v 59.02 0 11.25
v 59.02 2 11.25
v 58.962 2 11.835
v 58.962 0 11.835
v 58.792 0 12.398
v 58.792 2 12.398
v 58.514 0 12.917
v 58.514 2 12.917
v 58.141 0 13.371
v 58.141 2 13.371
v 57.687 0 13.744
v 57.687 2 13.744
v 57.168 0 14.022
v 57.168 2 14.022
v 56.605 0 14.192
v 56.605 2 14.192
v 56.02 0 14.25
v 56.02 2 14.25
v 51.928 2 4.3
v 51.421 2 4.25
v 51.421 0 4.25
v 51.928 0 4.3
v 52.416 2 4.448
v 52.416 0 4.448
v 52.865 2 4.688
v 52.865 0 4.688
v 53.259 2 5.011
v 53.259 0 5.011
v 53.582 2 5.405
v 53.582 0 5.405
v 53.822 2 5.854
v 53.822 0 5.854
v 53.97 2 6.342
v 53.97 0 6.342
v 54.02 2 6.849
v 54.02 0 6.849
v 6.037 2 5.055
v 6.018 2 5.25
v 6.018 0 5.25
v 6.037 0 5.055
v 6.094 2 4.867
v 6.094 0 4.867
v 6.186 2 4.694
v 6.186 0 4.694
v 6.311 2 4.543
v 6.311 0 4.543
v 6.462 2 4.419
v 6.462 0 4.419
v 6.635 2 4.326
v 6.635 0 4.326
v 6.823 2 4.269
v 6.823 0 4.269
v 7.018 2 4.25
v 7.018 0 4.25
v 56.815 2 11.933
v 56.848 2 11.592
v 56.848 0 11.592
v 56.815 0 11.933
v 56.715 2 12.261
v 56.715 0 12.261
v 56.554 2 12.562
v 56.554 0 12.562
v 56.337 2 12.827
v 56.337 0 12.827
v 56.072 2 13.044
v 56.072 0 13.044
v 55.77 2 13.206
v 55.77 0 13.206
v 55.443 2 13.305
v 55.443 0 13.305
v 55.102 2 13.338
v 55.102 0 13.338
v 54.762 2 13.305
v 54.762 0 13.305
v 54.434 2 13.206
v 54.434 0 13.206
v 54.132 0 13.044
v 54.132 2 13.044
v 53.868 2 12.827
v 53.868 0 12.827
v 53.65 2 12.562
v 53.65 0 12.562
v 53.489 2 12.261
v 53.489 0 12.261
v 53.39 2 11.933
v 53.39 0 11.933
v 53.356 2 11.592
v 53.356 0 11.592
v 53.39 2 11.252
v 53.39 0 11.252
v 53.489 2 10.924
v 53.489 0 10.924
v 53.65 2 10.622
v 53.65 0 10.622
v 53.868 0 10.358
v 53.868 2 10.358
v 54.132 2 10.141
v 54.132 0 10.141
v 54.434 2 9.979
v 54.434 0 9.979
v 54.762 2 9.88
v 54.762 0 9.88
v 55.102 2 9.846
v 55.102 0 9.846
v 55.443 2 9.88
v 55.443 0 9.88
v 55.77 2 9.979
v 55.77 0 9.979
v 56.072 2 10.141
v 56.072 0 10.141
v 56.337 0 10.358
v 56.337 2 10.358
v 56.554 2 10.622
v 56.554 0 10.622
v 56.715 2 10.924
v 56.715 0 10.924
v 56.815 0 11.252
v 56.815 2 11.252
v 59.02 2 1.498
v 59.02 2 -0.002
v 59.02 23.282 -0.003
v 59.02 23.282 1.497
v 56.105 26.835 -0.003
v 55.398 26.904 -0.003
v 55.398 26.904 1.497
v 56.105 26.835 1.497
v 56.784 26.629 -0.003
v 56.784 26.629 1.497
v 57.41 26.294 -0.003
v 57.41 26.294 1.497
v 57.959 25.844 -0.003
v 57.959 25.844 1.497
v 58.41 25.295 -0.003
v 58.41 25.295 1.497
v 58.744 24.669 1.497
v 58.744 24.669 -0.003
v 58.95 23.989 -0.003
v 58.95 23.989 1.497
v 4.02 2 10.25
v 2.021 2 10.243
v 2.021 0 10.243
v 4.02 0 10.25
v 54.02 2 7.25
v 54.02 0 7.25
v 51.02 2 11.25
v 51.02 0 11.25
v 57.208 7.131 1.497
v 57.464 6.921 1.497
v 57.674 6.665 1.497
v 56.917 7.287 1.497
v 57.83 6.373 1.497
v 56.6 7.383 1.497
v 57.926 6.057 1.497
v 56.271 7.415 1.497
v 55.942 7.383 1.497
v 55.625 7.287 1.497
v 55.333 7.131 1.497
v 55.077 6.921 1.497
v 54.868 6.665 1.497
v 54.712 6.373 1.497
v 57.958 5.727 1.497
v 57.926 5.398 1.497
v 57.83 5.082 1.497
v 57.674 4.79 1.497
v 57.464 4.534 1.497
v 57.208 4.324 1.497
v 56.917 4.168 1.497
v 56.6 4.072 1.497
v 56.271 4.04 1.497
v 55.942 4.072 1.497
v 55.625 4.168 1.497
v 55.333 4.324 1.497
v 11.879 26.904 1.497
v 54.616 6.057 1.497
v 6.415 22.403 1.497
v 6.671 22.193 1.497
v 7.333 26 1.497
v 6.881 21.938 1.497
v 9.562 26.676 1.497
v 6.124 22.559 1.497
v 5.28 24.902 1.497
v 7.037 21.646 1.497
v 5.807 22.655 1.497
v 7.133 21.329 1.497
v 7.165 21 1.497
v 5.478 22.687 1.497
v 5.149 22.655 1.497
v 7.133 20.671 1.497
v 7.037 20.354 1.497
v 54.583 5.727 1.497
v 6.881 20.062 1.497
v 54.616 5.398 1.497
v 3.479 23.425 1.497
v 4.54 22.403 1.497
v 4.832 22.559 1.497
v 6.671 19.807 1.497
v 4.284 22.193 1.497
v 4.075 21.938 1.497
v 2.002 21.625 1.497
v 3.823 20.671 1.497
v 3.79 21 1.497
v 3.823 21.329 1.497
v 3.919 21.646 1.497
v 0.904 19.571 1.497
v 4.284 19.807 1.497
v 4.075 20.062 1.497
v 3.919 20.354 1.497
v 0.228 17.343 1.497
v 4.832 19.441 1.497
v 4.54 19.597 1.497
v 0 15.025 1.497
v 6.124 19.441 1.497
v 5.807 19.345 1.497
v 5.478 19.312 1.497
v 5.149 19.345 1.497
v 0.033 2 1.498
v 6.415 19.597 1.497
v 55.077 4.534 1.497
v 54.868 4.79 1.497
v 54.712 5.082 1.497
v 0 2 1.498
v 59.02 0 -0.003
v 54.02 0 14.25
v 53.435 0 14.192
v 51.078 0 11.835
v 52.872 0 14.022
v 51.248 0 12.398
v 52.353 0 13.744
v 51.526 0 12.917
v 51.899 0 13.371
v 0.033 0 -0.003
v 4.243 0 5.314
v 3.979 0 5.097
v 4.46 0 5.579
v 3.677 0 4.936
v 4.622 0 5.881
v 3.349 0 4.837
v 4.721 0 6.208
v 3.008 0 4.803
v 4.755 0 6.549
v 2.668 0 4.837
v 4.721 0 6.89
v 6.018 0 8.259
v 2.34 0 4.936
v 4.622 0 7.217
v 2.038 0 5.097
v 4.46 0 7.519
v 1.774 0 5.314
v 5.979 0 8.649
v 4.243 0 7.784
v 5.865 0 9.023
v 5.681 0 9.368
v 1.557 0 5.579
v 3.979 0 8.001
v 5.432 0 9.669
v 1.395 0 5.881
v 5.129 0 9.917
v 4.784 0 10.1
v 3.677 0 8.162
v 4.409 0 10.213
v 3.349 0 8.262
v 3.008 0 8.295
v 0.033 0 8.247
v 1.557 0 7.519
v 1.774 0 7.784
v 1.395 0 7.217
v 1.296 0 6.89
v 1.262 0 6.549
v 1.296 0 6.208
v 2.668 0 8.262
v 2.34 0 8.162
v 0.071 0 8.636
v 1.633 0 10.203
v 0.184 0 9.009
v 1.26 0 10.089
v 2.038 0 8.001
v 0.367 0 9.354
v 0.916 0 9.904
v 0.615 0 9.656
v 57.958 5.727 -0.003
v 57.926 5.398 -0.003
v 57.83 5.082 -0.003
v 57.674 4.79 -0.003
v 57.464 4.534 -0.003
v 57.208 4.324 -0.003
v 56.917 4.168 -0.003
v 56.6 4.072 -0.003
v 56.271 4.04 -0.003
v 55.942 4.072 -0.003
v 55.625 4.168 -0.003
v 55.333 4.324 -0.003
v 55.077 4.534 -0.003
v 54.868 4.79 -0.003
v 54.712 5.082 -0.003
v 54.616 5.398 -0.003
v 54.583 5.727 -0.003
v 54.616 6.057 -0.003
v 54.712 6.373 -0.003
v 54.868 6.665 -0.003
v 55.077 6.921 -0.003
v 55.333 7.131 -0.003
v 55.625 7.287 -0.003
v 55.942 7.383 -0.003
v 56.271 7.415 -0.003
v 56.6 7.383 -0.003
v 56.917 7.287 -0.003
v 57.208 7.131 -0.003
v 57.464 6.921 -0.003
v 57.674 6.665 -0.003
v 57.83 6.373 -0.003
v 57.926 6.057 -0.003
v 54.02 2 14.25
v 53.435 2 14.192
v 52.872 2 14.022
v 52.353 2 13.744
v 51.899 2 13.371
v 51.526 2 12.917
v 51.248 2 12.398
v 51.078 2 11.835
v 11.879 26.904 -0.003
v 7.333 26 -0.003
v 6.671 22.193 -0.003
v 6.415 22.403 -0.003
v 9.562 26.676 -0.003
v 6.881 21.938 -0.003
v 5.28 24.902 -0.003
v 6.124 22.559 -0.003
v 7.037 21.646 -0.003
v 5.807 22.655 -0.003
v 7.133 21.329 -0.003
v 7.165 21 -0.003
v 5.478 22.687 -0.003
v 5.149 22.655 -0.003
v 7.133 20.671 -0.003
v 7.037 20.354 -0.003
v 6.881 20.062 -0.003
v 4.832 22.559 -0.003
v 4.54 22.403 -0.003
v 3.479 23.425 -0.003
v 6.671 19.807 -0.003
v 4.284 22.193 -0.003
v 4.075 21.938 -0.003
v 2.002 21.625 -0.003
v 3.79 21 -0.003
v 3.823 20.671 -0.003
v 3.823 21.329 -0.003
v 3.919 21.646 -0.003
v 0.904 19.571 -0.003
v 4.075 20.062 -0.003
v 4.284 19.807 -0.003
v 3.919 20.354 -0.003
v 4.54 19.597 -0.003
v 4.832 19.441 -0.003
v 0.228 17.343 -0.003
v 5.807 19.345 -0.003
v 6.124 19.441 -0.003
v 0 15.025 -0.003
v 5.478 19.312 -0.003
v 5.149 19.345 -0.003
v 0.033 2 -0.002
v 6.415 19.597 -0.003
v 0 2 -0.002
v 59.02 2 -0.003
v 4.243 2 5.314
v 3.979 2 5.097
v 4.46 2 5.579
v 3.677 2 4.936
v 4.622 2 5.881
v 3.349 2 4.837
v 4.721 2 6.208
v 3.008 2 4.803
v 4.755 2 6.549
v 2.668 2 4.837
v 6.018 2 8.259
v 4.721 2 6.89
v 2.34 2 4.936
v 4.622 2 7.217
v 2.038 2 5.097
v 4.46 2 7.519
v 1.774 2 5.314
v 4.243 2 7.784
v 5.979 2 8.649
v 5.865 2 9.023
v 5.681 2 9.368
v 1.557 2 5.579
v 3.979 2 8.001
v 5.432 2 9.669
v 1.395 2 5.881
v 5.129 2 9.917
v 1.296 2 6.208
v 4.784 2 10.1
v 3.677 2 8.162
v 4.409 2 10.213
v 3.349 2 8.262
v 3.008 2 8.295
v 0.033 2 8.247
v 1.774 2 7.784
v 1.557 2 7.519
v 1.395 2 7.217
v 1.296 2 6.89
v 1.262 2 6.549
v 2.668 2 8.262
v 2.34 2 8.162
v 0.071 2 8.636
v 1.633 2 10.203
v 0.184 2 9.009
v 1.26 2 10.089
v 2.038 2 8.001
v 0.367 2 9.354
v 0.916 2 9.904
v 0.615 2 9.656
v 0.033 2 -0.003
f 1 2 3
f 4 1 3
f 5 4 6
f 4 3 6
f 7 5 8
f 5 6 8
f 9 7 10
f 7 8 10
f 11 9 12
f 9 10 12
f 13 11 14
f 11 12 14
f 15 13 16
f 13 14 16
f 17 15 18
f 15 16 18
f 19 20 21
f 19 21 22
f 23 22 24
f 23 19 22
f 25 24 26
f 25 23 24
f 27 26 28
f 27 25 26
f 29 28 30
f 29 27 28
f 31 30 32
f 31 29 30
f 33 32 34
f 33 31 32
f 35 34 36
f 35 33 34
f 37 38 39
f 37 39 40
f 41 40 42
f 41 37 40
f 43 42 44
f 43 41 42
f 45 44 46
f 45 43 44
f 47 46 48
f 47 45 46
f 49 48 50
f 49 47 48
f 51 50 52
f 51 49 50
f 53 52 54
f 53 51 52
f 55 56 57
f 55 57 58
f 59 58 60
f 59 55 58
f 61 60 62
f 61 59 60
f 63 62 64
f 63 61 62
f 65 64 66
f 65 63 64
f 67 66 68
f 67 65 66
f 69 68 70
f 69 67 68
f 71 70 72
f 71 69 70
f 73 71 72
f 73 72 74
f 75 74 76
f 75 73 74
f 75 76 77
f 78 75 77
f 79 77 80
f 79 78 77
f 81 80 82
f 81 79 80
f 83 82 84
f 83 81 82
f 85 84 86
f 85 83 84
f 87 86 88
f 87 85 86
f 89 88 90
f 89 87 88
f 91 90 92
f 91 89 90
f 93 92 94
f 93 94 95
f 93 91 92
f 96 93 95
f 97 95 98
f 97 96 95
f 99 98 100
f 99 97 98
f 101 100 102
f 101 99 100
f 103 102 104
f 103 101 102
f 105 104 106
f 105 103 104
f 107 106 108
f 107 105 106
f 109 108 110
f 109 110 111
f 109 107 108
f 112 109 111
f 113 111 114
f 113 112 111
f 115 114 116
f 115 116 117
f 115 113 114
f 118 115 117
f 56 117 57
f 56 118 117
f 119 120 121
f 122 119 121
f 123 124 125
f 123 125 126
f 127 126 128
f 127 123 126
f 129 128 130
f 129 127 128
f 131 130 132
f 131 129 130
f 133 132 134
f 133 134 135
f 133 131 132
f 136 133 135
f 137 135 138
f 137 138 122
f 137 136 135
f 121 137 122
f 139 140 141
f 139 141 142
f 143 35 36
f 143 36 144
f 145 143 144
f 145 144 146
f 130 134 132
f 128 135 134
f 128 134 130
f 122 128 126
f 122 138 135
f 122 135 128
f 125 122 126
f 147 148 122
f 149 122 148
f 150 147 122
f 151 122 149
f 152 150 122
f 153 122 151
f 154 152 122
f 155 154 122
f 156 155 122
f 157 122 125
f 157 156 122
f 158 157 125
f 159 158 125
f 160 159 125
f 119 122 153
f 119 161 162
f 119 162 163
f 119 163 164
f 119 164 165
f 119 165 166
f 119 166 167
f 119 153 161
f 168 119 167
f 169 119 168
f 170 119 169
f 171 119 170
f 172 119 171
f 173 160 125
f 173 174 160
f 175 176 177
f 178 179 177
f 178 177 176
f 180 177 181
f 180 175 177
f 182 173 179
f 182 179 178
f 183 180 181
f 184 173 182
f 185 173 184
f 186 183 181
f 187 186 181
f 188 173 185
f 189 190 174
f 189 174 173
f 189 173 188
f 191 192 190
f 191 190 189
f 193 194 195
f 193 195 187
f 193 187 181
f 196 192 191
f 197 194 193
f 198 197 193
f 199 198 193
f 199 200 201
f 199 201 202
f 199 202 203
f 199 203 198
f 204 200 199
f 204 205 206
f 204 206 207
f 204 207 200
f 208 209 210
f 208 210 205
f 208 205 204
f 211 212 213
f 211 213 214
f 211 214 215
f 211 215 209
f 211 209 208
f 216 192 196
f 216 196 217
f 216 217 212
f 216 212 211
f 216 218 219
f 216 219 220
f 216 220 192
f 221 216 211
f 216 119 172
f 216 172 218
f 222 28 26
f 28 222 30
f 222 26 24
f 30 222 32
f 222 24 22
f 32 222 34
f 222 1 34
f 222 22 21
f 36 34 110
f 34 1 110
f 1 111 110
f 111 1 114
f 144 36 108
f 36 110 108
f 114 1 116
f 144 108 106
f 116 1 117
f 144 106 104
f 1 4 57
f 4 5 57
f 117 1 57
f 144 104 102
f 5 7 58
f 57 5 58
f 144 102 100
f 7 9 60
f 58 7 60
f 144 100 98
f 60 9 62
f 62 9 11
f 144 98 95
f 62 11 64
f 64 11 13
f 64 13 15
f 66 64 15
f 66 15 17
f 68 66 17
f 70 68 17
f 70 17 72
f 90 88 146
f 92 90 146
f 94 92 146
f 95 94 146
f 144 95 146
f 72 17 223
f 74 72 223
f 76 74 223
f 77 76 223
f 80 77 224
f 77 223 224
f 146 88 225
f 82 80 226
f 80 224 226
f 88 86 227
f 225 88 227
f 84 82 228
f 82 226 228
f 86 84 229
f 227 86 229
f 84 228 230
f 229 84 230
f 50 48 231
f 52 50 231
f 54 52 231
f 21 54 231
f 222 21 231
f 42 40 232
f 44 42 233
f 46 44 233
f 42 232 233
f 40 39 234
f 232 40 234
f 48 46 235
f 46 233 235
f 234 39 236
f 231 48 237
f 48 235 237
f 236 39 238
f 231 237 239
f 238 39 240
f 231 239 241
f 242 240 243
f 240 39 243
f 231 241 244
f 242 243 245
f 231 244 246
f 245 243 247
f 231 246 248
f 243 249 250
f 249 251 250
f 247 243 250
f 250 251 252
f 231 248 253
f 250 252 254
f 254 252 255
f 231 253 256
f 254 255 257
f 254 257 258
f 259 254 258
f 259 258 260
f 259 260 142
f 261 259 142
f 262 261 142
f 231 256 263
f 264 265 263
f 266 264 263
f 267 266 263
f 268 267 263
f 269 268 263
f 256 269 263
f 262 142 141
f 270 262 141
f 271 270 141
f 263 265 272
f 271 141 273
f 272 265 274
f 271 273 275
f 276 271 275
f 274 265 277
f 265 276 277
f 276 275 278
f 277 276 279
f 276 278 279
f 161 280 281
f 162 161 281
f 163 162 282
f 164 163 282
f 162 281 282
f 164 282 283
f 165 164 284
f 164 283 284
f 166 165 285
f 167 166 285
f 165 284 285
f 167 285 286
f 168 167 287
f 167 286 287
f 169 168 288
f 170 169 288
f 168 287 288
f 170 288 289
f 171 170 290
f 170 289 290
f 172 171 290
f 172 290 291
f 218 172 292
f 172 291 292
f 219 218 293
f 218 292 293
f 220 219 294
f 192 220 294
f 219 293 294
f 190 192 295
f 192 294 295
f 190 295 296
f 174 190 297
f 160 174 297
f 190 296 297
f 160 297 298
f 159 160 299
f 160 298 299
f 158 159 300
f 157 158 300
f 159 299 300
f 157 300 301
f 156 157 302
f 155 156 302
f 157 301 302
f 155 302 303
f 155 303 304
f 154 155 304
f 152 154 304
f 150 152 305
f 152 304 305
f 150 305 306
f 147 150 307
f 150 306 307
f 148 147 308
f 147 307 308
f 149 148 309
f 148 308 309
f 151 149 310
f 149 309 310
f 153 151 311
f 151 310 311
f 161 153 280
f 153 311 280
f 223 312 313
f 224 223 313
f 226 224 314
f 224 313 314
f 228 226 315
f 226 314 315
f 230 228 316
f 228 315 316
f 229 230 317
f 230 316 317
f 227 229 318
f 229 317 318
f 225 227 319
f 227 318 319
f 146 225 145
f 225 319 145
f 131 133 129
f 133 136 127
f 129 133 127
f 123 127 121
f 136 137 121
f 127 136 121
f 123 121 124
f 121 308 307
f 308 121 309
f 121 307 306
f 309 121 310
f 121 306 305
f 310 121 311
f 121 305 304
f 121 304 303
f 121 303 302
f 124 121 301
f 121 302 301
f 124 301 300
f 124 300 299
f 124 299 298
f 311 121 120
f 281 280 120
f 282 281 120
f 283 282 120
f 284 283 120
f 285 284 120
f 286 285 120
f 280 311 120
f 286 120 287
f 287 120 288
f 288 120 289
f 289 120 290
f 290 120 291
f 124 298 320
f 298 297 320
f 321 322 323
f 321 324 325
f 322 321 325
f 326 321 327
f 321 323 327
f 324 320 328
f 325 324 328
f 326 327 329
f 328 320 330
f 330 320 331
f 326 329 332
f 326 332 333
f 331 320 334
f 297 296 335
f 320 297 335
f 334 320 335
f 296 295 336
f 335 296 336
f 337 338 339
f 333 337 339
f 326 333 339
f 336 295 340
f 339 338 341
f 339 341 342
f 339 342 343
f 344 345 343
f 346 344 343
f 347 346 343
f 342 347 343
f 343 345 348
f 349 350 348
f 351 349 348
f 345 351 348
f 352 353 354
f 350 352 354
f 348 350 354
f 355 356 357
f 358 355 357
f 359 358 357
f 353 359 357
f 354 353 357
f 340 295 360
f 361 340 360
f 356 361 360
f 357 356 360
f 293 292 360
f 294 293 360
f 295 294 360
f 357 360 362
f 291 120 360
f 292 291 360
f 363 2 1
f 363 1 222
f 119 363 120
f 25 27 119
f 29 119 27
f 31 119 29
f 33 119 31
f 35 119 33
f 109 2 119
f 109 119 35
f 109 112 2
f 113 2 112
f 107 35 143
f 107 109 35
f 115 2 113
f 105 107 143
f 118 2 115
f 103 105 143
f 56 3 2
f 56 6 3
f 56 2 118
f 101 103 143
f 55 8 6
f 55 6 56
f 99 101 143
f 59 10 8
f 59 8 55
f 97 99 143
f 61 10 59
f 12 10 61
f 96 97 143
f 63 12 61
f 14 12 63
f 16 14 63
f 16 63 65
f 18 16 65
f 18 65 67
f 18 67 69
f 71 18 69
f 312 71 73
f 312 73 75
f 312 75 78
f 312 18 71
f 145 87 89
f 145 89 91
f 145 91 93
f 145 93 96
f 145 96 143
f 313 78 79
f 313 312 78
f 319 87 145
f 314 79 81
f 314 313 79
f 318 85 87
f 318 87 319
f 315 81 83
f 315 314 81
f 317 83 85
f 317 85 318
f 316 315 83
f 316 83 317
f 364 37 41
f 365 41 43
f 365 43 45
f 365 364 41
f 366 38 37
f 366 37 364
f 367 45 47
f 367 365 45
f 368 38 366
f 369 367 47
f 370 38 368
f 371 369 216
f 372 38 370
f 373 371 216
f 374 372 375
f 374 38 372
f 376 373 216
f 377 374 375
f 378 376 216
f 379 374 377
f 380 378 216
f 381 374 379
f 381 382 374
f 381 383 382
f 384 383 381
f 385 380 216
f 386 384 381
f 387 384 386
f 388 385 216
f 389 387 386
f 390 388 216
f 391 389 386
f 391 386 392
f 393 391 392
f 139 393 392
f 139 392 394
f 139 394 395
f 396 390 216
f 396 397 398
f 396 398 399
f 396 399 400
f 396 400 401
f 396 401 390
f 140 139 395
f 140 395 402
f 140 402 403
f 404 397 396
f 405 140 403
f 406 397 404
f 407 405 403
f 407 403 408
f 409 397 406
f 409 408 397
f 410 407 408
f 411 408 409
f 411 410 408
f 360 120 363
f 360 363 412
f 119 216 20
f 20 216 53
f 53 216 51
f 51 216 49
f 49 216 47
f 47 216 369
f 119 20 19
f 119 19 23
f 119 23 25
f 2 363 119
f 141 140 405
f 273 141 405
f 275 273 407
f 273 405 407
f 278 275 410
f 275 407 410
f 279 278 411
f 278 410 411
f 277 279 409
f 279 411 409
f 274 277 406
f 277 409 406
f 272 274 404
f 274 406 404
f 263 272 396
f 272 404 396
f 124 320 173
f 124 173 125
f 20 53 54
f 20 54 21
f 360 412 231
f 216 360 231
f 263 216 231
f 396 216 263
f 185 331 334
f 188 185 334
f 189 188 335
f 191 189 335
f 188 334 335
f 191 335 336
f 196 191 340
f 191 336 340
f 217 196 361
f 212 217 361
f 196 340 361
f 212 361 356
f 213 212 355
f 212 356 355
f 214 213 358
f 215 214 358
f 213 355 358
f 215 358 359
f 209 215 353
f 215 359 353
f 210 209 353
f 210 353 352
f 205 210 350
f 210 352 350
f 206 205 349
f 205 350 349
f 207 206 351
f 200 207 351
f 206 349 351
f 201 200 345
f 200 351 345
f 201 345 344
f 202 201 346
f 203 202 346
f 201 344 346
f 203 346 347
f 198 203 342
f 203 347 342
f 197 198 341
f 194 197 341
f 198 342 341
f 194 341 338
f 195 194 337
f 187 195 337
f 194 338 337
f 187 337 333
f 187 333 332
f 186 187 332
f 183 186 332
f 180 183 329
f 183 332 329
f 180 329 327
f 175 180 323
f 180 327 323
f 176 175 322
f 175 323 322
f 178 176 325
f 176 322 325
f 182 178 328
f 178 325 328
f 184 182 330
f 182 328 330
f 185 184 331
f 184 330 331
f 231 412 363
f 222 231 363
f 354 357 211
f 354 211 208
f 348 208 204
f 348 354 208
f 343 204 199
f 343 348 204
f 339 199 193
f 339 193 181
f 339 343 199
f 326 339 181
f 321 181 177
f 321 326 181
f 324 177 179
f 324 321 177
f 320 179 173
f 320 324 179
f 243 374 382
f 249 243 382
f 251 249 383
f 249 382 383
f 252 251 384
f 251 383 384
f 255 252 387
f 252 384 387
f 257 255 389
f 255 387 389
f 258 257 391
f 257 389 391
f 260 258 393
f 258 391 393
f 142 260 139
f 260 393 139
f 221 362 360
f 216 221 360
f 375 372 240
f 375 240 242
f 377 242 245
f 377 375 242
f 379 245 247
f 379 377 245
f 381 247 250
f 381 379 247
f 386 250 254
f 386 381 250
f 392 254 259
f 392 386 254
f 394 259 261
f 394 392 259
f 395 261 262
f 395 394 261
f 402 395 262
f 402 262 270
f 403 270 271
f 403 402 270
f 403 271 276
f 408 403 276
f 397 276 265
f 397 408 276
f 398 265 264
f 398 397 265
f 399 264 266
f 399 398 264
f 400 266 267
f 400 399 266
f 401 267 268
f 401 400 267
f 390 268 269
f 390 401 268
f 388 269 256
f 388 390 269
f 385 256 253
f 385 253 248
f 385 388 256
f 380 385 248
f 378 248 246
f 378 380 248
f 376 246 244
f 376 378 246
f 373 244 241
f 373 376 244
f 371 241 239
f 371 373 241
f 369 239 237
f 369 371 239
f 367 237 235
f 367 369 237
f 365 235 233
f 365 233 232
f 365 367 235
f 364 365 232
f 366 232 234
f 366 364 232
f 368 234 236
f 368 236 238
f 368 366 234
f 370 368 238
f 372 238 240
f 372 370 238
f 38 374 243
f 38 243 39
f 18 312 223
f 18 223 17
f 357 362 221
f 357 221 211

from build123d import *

# Parameters (mm, degrees)
SKETCH001_R       = 1.687519
PAD001_DEPTH      = 1.5
SKETCH_R          = 1.746092
PAD_DEPTH         = 2
FUSION_ROLL_ANGLE = 90


with BuildPart() as base_and_horizontal_holder:
    # Sketch001 → Pad001 (new body)
    with BuildSketch(Plane.XZ.offset(1.2525)):
        with BuildLine():
            Line((10.979984, 0), (69.999984, 0))
            Line((69.999984, 0), (69.999984, -21.282469))
            ThreePointArc((66.378106, -24.904346), (68.93916, -23.843523), (69.999984, -21.282469))
            Line((22.859289, -24.904346), (66.378106, -24.904346))
            ThreePointArc((10.979984, -13.025041), (14.459352, -21.424978), (22.859289, -24.904346))
            Line((10.979984, 0), (10.979984, -13.025041))
        make_face()
        with Locations((67.250752, -3.727469)):
            Circle(SKETCH001_R, mode=Mode.SUBTRACT)
        with Locations((16.457752, -18.999969)):
            Circle(SKETCH001_R, mode=Mode.SUBTRACT)
    extrude(amount=-PAD001_DEPTH)


with BuildPart() as icezum_vertical_horizontal_stand_holder:
    # Sketch → Pad (new body)
    with BuildSketch(Plane.XY):
        with BuildLine():
            Line((11.012519, -1.25328), (11.012519, 6.997142))
            ThreePointArc((13.001287, 8.992943), (11.59459, 8.405902), (11.012519, 6.997142))
            Line((13.001287, 8.992943), (15, 9))
            ThreePointArc((16.997615, 7.009425), (16.412099, 8.419465), (15, 9))
            Line((16.997615, 7.009425), (16.997615, 4))
            ThreePointArc((16.997615, 4), (17.290509, 3.292893), (17.997615, 3))
            Line((17.997615, 3), (62, 3))
            Line((62, 3), (62.401287, 3))
            ThreePointArc((62.401287, 3), (64.238855, 3.761145), (65, 5.598713))
            Line((65, 5.598713), (65, 6))
            Line((65, 6), (62, 10))
            ThreePointArc((65, 13), (62.87868, 12.12132), (62, 10))
            Line((65, 13), (67, 13))
            ThreePointArc((70, 10), (69.12132, 12.12132), (67, 13))
            Line((70, 10), (70, -1.25328))
            Line((11.012519, -1.25328), (70, -1.25328))
        make_face()
        with Locations((13.988471, 5.299093)):
            Circle(SKETCH_R, mode=Mode.SUBTRACT)
        with Locations((66.082271, 10.342403)):
            Circle(SKETCH_R, mode=Mode.SUBTRACT)
    extrude(amount=PAD_DEPTH)

    # Fusion: union base_and_horizontal_holder
    add(base_and_horizontal_holder.part)


with BuildPart() as icezum_vertical_horizontal_stand_holder_1:
    # Fusion roll: moved
    add(icezum_vertical_horizontal_stand_holder.part.rotate(Axis((0, 0, 0), (1, 0, 0)), FUSION_ROLL_ANGLE))


with BuildPart() as icezum_vertical_horizontal_stand_holder_2:
    # Fusion placement: moved
    add(icezum_vertical_horizontal_stand_holder_1.part.moved(Location((-10.98, 2, 1.25))))


solid = icezum_vertical_horizontal_stand_holder_2.part
